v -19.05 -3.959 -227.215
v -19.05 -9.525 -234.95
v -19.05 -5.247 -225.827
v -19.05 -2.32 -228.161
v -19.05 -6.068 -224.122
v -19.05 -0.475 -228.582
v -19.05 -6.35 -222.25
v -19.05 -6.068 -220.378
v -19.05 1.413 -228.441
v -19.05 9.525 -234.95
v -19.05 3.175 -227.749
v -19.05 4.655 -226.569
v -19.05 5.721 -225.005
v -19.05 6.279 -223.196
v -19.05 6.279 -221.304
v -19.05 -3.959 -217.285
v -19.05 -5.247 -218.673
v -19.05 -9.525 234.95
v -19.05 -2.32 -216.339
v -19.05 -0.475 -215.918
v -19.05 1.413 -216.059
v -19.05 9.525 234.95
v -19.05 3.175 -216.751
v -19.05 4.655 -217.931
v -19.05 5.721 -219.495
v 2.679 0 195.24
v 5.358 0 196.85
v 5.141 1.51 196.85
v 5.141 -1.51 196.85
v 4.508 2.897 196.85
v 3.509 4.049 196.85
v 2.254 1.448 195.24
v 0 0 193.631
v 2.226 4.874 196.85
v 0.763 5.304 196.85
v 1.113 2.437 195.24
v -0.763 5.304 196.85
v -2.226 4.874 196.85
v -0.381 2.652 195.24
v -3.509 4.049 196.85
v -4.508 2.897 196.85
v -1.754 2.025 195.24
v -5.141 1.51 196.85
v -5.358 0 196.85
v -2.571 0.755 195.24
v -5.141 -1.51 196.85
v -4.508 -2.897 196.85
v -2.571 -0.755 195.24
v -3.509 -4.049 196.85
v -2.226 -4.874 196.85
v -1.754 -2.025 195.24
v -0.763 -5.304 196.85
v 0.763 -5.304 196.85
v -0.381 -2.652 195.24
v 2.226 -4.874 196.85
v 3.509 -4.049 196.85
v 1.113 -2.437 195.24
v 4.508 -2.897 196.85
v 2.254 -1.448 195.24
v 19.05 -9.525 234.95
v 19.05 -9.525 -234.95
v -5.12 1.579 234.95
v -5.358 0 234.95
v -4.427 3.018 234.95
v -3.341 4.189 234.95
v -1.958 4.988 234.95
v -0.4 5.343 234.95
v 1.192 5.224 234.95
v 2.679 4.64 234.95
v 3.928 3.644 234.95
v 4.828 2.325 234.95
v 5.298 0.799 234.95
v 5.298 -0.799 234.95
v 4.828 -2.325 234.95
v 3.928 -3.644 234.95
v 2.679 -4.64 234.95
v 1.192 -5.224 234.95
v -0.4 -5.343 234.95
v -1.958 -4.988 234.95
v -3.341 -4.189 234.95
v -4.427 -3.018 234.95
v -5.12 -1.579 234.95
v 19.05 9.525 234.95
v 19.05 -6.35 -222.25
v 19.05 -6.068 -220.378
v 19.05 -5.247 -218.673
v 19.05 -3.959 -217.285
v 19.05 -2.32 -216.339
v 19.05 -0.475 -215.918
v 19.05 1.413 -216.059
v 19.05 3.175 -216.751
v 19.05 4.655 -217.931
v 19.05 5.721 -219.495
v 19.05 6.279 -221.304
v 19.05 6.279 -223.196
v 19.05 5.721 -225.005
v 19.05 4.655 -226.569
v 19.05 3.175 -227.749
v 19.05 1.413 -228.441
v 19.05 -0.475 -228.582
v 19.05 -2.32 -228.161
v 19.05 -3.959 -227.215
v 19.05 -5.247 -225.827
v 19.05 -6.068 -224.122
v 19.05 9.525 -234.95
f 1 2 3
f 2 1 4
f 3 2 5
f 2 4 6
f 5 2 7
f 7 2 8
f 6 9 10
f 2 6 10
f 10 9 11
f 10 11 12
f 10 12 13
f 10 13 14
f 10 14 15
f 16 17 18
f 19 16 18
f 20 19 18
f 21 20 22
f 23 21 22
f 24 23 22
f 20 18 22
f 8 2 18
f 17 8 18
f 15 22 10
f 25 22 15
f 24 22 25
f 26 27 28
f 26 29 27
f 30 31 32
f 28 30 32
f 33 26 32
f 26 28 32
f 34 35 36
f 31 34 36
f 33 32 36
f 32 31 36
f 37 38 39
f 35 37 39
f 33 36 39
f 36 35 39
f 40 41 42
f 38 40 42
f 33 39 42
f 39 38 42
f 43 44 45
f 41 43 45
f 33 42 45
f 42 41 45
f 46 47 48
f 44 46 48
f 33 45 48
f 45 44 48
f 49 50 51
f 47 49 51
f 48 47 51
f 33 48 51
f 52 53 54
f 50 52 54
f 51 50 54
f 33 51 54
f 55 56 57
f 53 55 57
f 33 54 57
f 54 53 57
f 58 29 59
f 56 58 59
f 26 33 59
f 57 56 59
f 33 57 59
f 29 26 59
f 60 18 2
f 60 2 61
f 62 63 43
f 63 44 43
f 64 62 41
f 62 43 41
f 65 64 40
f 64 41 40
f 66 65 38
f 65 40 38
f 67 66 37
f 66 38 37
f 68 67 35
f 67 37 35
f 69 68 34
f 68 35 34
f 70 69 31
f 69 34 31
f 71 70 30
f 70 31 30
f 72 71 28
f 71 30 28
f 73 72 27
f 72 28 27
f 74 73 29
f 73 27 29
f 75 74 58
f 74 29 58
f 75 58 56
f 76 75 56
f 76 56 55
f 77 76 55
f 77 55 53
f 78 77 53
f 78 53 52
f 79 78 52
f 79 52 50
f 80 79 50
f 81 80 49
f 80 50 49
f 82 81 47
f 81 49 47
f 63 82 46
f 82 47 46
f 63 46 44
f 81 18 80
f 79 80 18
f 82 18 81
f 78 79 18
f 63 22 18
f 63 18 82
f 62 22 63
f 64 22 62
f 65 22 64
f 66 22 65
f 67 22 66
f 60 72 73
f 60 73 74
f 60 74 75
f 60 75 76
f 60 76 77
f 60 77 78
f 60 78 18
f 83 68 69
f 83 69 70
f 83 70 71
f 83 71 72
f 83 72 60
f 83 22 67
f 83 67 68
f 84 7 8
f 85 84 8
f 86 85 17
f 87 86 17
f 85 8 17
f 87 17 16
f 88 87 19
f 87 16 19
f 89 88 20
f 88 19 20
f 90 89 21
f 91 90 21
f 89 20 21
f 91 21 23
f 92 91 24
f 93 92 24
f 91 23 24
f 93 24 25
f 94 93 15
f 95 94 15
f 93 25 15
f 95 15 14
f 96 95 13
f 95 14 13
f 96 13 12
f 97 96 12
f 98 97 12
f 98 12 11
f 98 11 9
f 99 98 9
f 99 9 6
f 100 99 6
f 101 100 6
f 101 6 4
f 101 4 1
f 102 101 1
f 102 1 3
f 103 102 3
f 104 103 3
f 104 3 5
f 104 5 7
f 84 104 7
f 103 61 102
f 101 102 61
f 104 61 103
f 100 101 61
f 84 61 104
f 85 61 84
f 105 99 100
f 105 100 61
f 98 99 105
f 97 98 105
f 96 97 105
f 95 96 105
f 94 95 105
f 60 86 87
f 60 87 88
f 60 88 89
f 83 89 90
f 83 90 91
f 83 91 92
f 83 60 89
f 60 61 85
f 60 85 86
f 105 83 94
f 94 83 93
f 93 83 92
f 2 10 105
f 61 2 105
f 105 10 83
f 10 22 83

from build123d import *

# Parameters (mm, degrees)
F0_W     = 38.1
F0_H     = 19.05
F1_DEPTH = 234.95
F3_D     = 12.7
F5_D     = 10.71626
F5_DEPTH = 38.1
F5_TIP   = 3.2194893086


# Not quite as in the source:
# - a length typed as a fraction of an inch, garbled in the dataset ("3 / 203.2 mm" for 3/8 in), is restored


with BuildPart() as f1:
    # F0 (on Top) → F1 (new body, symmetric)
    with BuildSketch(Plane.XY):
        Rectangle(F0_W, F0_H)
    extrude(amount=F1_DEPTH, both=True)

    # F3 (through all)
    with Locations(Plane.YZ.offset(19.05)):
        with Locations((0, -222.25)):
            Hole(F3_D / 2)

    # F5
    with Locations(Plane.XY.offset(234.95)):
        with Locations((0, 0)):
            Hole(F5_D / 2, depth=F5_DEPTH)
            with Locations((0, 0, -(F5_DEPTH + F5_TIP / 2))):  # 118° drill point
                Cone(0, F5_D / 2, F5_TIP, mode=Mode.SUBTRACT)


solid = f1.part
